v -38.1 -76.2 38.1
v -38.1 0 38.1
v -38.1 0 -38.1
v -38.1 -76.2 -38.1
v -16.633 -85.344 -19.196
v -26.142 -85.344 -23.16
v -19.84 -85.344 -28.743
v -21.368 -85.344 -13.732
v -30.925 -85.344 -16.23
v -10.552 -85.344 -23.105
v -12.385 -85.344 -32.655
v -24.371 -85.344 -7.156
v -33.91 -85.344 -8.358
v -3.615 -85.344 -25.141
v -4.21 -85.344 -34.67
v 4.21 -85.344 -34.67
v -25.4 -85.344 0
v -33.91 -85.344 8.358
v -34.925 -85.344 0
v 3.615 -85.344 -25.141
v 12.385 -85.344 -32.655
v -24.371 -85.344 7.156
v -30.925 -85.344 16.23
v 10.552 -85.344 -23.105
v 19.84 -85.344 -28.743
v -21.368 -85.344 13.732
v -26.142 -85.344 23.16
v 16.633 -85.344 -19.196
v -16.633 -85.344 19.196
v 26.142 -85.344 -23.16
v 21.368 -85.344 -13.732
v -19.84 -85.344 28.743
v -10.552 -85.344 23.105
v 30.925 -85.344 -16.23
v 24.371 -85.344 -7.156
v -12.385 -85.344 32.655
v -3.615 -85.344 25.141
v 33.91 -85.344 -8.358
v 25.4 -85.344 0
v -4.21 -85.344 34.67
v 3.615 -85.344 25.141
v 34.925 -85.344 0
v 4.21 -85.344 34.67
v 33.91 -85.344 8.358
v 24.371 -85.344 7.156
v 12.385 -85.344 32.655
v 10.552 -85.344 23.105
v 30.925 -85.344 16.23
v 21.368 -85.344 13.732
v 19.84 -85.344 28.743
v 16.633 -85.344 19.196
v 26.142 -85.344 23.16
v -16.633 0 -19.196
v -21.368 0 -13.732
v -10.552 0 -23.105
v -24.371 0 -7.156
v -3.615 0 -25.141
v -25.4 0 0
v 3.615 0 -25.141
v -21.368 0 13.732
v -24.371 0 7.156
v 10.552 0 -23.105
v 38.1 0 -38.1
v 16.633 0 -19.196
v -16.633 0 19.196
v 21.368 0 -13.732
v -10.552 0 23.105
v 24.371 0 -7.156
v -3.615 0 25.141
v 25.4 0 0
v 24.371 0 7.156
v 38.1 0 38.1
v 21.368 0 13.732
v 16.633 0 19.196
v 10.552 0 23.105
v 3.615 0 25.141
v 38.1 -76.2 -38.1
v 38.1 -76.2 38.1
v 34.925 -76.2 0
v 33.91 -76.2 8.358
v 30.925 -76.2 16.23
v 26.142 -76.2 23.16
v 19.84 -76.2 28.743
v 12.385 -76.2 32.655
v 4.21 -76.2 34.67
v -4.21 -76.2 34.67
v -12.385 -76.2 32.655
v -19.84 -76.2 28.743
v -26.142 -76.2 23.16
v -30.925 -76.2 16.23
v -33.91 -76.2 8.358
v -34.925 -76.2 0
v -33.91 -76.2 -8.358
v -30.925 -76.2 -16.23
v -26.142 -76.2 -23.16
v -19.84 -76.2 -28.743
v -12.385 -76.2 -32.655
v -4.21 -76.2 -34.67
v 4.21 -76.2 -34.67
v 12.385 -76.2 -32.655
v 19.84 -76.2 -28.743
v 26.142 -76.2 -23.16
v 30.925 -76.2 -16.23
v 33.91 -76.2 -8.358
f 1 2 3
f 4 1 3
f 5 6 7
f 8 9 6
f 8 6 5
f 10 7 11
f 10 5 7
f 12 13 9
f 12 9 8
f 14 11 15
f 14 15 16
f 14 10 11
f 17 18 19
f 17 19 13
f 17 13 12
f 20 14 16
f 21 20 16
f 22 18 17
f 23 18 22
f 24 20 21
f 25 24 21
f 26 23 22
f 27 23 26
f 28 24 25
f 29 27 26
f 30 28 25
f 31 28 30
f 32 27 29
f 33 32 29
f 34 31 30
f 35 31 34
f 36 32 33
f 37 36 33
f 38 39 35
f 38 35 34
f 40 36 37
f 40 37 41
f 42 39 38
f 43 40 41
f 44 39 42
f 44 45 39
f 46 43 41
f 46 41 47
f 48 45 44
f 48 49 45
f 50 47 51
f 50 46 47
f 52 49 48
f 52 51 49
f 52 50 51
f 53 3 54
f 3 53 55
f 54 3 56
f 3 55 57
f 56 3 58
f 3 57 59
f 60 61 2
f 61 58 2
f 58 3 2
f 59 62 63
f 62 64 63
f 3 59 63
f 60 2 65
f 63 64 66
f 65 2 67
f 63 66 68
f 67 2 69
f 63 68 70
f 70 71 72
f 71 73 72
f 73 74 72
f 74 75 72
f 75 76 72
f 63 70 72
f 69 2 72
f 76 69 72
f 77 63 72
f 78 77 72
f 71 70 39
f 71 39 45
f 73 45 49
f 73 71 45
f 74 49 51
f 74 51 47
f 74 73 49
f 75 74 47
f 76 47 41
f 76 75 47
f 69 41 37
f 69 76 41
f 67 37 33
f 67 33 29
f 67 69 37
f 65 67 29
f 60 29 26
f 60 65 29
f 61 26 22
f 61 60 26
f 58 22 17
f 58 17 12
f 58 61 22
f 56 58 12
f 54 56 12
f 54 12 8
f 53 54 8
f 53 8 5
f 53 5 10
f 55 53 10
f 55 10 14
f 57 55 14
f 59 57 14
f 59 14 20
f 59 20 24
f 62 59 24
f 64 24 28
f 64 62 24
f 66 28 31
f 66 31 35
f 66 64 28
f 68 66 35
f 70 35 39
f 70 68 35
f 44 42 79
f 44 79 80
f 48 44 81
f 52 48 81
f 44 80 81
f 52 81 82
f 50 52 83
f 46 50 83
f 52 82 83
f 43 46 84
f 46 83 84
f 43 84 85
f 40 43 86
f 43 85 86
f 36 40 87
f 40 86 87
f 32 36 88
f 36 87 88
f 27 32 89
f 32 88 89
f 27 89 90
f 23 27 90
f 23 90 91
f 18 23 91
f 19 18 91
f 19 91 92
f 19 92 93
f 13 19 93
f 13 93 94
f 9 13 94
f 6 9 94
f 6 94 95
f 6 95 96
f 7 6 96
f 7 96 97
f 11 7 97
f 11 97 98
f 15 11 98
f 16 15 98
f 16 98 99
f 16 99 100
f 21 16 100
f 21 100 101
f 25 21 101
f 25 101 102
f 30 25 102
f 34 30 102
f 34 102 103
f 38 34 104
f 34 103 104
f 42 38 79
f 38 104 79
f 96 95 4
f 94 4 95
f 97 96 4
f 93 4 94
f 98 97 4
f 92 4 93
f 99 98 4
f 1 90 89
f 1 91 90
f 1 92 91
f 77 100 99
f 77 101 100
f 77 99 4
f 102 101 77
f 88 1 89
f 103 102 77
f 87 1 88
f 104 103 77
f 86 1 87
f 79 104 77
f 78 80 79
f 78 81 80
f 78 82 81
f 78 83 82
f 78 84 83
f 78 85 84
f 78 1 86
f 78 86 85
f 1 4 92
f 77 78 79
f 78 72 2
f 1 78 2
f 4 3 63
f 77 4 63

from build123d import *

# Parameters (mm, degrees)
F0_R     = 34.925
F0_R_2   = 25.4
F1_DEPTH = 85.344
F2_DEPTH = 76.2


with BuildPart() as f1:
    # F0 (on Front) → F1 (new body)
    with BuildSketch(Plane.XZ):
        Circle(F0_R)
        Circle(F0_R_2, mode=Mode.SUBTRACT)
    extrude(amount=F1_DEPTH)

    # F0 (on Front) → F2 (join)
    with BuildSketch(Plane.XZ):
        Polygon((38.1, 38.1), (0, 38.1), (-38.1, 38.1), (-38.1, -38.1), (38.1, -38.1), align=None)
        Circle(F0_R, mode=Mode.SUBTRACT)
    extrude(amount=F2_DEPTH)


solid = f1.part
